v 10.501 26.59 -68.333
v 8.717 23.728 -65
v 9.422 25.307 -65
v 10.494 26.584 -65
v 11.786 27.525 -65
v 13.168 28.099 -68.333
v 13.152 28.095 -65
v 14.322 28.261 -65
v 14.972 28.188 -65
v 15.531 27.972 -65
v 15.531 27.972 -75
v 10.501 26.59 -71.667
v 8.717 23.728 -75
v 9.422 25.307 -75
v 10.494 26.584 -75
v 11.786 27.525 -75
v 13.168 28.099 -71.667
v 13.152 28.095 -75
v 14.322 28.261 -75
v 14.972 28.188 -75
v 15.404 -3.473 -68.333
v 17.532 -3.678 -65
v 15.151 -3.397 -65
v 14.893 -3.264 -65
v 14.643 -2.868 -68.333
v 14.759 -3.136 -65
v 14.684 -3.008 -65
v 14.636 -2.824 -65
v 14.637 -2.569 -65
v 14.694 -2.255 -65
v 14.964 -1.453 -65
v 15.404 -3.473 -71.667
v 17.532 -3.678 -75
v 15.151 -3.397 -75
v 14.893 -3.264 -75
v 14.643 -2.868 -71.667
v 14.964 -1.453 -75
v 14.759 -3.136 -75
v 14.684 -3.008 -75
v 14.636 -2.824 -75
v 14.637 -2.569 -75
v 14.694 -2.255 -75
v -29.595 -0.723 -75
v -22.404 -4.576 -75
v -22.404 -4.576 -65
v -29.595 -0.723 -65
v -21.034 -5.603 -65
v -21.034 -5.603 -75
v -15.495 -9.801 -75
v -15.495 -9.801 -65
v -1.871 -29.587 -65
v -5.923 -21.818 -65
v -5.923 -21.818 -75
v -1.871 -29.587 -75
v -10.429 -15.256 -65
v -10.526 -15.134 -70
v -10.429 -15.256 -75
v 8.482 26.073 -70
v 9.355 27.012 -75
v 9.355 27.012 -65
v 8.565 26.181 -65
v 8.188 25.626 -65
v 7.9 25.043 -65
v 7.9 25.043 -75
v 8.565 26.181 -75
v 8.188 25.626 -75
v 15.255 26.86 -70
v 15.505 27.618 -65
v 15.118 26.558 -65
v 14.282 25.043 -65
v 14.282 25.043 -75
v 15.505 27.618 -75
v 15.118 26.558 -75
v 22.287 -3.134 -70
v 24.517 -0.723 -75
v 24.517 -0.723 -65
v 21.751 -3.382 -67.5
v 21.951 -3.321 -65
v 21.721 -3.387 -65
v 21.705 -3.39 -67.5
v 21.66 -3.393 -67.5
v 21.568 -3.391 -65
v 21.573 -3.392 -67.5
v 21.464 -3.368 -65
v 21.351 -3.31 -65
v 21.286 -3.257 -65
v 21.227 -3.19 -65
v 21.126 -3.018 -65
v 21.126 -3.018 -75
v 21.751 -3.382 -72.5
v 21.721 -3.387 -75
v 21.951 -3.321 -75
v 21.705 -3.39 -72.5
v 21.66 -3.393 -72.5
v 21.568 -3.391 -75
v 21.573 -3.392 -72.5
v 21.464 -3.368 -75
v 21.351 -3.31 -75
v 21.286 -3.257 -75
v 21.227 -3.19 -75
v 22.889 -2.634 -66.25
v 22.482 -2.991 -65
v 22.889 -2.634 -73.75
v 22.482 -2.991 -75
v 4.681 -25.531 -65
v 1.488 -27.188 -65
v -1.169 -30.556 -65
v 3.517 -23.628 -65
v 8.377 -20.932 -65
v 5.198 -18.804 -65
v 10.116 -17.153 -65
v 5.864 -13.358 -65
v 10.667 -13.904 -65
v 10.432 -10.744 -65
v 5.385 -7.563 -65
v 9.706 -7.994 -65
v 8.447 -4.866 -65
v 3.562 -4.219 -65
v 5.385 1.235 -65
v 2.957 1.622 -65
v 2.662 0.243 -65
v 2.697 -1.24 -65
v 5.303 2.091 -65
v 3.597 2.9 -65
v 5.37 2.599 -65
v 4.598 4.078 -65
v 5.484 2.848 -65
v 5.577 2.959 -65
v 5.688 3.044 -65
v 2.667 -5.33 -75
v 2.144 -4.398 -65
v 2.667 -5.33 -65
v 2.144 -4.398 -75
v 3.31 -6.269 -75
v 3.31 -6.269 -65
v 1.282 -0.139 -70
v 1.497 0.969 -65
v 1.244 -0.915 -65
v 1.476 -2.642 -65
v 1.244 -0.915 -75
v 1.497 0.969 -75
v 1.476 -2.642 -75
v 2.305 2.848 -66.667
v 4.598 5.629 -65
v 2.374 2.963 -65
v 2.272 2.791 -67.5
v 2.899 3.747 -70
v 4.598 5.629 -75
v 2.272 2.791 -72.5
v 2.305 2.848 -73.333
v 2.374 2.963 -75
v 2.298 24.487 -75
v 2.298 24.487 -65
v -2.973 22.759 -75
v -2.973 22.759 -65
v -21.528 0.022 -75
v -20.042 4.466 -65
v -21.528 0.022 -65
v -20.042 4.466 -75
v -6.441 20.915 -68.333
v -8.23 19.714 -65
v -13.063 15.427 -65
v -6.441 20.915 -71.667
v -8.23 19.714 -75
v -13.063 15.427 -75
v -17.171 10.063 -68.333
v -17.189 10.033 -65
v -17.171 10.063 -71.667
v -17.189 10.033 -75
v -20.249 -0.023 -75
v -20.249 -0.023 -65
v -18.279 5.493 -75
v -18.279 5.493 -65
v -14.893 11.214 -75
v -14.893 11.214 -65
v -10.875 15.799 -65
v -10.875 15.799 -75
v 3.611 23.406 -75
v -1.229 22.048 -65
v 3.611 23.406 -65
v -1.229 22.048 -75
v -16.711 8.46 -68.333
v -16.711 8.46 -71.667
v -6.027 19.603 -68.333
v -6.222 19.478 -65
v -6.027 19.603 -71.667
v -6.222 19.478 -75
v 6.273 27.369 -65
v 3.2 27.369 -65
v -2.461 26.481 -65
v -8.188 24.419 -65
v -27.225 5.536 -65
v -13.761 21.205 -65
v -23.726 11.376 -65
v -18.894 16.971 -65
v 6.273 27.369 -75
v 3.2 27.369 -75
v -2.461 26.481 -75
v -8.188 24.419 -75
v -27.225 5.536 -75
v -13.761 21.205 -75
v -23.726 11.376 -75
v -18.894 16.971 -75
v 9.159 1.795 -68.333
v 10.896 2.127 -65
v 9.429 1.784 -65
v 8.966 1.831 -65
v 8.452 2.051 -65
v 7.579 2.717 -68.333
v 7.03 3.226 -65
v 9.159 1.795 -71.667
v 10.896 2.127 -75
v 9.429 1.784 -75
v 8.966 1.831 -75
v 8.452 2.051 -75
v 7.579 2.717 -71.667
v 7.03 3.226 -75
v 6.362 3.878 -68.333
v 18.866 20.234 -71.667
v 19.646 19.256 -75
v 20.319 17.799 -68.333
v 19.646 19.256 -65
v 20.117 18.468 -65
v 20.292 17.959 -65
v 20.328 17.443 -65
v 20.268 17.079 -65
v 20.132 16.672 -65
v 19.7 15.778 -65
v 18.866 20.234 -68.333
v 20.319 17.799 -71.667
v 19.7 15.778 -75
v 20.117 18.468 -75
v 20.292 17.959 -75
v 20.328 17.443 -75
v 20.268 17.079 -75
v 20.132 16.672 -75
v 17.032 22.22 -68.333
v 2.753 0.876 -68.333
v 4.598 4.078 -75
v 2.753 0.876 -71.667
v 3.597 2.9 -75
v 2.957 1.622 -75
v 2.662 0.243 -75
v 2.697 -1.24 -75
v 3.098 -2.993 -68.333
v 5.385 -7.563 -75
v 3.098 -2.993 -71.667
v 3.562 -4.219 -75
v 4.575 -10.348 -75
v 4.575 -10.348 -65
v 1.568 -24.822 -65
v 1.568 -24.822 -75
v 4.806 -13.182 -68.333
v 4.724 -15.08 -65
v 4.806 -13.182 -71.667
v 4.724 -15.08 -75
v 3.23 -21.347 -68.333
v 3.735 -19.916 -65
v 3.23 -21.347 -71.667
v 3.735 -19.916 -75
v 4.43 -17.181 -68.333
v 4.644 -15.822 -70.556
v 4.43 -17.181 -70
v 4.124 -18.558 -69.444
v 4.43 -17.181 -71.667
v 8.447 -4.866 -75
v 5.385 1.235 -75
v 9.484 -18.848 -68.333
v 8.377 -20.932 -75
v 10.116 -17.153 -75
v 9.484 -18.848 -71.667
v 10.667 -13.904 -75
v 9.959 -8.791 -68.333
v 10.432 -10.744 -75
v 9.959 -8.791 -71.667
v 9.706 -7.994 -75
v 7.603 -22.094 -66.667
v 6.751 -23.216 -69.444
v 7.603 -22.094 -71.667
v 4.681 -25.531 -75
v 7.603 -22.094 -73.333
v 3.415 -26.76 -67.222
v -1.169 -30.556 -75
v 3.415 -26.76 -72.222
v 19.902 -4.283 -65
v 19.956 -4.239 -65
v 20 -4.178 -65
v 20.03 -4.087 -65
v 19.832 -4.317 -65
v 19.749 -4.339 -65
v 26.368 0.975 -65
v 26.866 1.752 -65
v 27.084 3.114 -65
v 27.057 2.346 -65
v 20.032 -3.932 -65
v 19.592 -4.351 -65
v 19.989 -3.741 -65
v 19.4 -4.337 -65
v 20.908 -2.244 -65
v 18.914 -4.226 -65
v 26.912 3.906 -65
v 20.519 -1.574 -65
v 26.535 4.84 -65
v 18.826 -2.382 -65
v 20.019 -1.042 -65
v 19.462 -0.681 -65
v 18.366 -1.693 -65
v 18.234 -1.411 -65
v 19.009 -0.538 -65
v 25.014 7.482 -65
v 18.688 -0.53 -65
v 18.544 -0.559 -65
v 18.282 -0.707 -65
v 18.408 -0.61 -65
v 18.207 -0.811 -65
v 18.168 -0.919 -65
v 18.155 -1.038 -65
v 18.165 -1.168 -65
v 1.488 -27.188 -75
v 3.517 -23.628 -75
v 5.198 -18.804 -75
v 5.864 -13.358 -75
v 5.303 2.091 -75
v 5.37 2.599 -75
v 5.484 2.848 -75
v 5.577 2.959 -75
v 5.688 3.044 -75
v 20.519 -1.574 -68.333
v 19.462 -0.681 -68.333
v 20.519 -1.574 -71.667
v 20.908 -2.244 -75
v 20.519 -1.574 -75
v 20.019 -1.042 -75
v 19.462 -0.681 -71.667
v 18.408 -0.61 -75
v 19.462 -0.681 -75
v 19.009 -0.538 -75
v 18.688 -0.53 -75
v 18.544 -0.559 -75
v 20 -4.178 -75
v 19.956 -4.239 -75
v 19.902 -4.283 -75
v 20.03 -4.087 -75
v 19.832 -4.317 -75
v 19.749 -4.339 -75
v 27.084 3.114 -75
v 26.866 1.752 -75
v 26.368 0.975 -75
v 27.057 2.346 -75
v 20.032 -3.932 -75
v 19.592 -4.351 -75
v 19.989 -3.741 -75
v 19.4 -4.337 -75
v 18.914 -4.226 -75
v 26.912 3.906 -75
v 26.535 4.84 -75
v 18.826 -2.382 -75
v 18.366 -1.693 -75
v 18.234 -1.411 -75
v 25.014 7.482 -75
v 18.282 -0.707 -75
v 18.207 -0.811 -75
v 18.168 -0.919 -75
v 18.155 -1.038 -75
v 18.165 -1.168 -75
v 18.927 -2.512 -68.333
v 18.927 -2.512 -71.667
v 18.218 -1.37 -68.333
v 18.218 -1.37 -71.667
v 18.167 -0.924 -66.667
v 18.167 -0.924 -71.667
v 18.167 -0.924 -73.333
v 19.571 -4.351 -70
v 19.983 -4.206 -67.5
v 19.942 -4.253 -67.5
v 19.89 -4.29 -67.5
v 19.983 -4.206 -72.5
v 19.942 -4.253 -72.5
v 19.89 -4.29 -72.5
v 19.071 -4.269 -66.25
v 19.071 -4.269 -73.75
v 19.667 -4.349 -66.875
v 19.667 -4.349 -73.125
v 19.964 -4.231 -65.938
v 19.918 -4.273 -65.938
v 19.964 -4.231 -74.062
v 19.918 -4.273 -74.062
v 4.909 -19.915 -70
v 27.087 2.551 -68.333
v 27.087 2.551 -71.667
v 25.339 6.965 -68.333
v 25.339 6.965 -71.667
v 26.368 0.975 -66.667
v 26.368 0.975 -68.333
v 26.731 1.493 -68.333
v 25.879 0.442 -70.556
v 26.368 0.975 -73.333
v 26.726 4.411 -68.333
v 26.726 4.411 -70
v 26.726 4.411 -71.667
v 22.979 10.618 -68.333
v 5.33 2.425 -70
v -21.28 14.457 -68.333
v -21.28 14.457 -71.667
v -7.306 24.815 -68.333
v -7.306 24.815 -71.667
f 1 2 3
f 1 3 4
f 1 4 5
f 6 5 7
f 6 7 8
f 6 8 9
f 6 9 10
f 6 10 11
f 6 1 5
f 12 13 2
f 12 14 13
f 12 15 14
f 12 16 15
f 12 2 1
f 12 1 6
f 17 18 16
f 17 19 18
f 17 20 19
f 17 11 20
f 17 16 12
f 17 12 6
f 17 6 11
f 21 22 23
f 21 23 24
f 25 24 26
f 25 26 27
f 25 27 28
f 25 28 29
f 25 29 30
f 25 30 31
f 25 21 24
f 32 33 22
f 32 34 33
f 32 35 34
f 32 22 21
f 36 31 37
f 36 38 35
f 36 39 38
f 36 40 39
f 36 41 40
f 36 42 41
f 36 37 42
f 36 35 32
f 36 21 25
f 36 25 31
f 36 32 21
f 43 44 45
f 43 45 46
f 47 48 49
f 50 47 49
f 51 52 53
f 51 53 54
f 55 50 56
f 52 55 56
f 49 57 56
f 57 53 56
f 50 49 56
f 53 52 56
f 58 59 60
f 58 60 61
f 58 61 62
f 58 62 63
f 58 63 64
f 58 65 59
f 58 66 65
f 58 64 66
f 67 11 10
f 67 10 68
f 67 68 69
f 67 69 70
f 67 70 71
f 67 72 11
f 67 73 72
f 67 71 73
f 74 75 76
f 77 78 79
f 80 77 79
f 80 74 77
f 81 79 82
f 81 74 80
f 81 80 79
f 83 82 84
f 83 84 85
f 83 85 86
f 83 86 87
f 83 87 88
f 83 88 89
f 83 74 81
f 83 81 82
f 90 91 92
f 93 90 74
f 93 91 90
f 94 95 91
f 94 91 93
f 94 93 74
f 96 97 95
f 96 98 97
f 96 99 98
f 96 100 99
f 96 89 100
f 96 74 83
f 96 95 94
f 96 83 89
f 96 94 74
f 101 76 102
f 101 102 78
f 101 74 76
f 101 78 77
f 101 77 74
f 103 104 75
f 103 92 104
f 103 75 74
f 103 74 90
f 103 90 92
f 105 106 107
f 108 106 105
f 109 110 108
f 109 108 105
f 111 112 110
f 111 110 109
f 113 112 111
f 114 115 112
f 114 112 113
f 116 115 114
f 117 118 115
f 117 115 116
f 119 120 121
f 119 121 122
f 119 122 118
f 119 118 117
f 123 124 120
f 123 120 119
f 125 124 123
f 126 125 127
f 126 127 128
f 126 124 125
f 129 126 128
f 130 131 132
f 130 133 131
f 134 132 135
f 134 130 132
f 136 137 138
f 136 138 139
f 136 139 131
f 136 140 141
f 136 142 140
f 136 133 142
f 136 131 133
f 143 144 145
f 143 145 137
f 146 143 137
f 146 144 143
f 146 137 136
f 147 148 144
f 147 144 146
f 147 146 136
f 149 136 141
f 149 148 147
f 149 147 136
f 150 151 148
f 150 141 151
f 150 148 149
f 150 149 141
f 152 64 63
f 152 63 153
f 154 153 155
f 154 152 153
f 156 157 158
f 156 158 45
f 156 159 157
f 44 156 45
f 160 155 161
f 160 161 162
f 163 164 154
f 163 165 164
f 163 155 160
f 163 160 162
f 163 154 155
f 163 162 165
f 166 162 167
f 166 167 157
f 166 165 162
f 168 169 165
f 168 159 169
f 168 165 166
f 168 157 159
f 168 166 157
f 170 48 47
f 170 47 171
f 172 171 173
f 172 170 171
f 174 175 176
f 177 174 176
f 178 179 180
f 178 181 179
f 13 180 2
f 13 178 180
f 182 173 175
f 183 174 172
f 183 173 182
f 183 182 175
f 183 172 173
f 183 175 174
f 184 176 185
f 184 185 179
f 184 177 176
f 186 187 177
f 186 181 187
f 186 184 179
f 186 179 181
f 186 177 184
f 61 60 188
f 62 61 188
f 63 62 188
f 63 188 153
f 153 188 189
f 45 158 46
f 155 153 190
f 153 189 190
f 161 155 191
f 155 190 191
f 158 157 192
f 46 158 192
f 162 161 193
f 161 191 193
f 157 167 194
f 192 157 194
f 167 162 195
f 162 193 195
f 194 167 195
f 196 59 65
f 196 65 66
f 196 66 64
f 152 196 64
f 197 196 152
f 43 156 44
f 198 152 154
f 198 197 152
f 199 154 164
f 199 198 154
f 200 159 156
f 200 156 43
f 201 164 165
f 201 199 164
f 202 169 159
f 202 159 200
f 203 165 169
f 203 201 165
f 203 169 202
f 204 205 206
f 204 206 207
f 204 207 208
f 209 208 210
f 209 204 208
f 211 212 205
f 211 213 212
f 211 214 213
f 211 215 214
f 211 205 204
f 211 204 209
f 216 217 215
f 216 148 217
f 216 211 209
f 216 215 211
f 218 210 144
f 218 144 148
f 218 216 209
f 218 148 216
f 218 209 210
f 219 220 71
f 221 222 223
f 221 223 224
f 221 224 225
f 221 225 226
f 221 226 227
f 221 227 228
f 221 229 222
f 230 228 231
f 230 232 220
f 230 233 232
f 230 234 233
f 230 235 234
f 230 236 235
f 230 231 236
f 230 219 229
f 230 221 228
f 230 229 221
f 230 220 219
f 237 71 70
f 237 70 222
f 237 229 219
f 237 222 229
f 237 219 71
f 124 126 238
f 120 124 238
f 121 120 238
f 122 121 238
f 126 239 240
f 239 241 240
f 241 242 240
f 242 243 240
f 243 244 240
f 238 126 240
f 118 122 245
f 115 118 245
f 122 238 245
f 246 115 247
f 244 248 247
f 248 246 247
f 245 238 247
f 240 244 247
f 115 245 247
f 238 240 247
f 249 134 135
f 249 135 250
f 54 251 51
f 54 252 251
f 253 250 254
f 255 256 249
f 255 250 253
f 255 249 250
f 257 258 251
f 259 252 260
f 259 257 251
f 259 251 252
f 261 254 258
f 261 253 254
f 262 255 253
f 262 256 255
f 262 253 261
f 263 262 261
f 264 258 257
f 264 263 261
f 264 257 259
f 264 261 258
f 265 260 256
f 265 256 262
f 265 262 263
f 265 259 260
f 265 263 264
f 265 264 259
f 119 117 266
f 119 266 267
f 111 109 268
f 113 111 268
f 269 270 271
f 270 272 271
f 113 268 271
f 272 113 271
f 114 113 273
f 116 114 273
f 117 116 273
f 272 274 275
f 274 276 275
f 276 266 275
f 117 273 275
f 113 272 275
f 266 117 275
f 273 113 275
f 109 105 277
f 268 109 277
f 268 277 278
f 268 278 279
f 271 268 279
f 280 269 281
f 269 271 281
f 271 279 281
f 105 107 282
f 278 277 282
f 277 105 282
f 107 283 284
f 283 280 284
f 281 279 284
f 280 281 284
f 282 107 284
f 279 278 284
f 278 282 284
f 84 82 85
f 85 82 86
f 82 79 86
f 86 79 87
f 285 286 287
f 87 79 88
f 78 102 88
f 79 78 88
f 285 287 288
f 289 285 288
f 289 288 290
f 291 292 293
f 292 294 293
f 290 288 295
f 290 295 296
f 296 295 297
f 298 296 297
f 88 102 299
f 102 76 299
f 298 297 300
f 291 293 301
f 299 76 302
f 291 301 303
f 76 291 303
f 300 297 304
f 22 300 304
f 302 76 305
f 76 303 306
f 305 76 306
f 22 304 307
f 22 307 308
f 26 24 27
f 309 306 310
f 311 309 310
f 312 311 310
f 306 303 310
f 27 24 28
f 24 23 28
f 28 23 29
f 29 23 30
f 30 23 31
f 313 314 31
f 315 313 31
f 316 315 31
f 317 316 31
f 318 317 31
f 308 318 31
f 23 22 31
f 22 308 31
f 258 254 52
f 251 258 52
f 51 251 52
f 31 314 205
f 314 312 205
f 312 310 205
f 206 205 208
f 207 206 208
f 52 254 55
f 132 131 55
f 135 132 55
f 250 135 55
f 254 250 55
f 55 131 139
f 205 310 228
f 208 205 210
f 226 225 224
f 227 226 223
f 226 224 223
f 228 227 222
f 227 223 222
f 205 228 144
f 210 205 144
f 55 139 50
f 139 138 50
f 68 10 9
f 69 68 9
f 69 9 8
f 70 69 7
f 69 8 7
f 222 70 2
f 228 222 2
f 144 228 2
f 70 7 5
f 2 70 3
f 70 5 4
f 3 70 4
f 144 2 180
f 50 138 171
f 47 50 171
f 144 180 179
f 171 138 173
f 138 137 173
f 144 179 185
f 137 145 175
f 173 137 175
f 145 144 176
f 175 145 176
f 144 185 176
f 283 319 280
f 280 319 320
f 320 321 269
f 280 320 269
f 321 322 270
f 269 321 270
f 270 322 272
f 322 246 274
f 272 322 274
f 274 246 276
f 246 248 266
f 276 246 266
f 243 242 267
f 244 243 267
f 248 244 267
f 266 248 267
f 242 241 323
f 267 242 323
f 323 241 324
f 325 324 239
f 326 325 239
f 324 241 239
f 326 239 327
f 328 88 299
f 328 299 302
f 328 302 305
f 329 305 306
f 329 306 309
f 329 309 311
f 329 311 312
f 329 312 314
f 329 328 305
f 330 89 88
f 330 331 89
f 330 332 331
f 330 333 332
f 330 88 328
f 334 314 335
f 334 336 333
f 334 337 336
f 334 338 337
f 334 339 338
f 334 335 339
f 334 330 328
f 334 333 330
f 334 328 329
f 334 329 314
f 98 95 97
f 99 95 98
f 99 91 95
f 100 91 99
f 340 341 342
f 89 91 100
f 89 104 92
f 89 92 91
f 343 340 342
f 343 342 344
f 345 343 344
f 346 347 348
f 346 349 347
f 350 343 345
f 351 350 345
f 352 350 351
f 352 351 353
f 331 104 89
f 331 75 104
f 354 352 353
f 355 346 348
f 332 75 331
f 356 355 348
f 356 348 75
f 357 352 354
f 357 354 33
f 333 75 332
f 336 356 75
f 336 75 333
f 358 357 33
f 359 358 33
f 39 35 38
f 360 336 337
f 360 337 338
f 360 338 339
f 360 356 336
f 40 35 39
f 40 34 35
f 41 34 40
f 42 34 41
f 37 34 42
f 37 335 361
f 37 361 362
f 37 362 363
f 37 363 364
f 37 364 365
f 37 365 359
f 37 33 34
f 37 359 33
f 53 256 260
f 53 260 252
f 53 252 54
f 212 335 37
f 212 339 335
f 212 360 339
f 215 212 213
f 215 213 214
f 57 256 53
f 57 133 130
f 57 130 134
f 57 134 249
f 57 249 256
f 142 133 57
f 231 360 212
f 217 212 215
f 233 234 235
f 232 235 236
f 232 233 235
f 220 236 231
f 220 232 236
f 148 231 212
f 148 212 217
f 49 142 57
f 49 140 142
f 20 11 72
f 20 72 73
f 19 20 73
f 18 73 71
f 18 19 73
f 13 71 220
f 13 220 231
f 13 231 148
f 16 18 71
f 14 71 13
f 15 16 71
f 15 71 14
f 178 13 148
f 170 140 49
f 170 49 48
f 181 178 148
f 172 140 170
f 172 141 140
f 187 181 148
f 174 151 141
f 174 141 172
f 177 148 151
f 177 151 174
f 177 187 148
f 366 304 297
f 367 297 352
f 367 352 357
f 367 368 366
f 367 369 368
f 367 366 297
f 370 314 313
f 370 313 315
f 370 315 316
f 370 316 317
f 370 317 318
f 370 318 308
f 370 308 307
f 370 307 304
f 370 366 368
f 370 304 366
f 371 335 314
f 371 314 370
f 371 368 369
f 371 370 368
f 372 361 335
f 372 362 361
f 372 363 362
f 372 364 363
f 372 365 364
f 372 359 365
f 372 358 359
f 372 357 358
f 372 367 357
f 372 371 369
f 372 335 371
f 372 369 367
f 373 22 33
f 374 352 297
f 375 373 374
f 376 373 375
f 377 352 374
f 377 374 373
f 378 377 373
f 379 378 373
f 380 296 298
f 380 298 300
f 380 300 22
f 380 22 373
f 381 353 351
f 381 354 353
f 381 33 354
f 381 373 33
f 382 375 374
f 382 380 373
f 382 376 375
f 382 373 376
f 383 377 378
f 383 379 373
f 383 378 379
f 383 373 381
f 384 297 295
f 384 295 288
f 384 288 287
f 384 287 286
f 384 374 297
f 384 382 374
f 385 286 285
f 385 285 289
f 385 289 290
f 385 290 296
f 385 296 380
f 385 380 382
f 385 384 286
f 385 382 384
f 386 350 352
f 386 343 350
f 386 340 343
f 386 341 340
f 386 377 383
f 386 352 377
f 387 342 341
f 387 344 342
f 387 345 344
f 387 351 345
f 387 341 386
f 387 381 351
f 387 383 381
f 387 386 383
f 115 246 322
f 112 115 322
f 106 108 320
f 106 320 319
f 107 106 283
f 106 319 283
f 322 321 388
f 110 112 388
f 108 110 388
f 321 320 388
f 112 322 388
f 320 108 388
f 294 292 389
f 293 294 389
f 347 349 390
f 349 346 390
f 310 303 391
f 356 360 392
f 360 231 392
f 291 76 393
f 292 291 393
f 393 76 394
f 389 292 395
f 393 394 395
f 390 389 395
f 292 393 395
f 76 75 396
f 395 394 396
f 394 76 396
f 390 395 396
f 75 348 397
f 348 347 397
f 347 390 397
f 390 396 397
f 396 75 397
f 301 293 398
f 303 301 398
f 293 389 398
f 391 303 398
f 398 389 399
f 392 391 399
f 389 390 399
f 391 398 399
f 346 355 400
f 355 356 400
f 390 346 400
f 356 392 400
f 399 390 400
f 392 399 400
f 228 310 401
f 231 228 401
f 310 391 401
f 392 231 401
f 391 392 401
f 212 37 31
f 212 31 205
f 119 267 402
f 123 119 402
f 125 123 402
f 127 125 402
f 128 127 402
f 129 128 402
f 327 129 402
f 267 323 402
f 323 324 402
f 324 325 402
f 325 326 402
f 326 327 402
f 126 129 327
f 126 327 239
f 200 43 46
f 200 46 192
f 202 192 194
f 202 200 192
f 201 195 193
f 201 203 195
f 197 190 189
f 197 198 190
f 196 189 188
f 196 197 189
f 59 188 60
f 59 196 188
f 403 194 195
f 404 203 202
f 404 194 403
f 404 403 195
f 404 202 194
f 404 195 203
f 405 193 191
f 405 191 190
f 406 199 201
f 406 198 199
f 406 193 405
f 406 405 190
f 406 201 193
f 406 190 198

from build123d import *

# Parameters (mm, degrees)
BOSS_EXTRUDE6_START   = -75
BOSS_EXTRUDE6_DEPTH   = 10
BOSS_EXTRUDE6_2_DEPTH = 10
BOSS_EXTRUDE6_3_DEPTH = 10


with BuildPart() as part:
    # Sketch60 → Boss-Extrude6 (new body)
    with BuildSketch(Plane.XY.offset(BOSS_EXTRUDE6_START)):
        with BuildLine():
            add(Edge.make_bspline(
                [(7.899510272, 25.043165506), (-7.616062527, 25.257173407), (-20.549288392, 10.975590449), (-22.404008997, -4.575528469)],
                knots=[0, 0, 0, 0, 1, 1, 1, 1], degree=3))
            Line((-22.404008997, -4.575528469), (-29.594674586, -0.723386189))
            add(Edge.make_bspline(
                [(-29.594674586, -0.723386189), (-25.100511328, 15.755212423), (-7.658548516, 30.008093265), (9.354764023, 27.012038227)],
                knots=[0, 0, 0, 0, 1, 1, 1, 1], degree=3))
            add(Edge.make_bspline(
                [(9.354764023, 27.012038227), (8.337507713, 26.11755026), (7.899510272, 25.043165506)],
                knots=[0, 0, 0, 1, 1, 1], degree=2))
        make_face()
    extrude(amount=BOSS_EXTRUDE6_DEPTH)


with BuildPart() as body_2:
    # Sketch60 → Boss-Extrude6 2 (new body)
    with BuildSketch(Plane.XY.offset(BOSS_EXTRUDE6_START)):
        with BuildLine():
            add(Edge.make_bspline(
                [(-21.034358408, -5.60276641), (-20.658581062, 8.553464489), (-7.290986028, 24.477751373), (8.717335457, 23.728095995)],
                knots=[0, 0, 0, 0, 1, 1, 1, 1], degree=3))
            add(Edge.make_bspline(
                [(8.717335457, 23.728095995), (9.66306194, 27.172801895), (13.715689902, 29.012097365), (15.531023575, 27.971601235)],
                knots=[0, 0, 0, 0, 1, 1, 1, 1], degree=3))
            add(Edge.make_bspline(
                [(15.531023575, 27.971601235), (15.602666955, 27.212057166), (14.28241125, 25.043165506)],
                knots=[0, 0, 0, 1, 1, 1], degree=2))
            add(Edge.make_bspline(
                [(14.28241125, 25.043165506), (20.78562941, 18.394903927), (21.000842635, 18.24447546), (19.700260455, 15.777854084)],
                knots=[0, 0, 0, 0, 1, 1, 1, 1], degree=3))
            add(Edge.make_bspline(
                [(24.516635928, -0.723386189), (29.387839262, 3.066606953), (27.141695792, 3.679164482), (19.700260455, 15.777854084)],
                knots=[0, 0, 0, 0, 1, 1, 1, 1], degree=3))
            add(Edge.make_bspline(
                [(24.516635928, -0.723386189), (21.753412083, -4.397354565), (21.126152372, -3.017689185)],
                knots=[0, 0, 0, 1, 1, 1], degree=2))
            add(Edge.make_bspline(
                [(21.126152372, -3.017689185), (20.896285535, -1.389746942), (19.308339169, -0.179826073), (18.408429615, -0.610217599)],
                knots=[0, 0, 0, 0, 1, 1, 1, 1], degree=3))
            add(Edge.make_bspline(
                [(18.408429615, -0.610217599), (17.58666802, -1.079795653), (18.932824528, -2.56687226), (19.989391926, -3.740836035)],
                knots=[0, 0, 0, 0, 1, 1, 1, 1], degree=3))
            add(Edge.make_bspline(
                [(19.989391926, -3.740836035), (20.380619428, -4.992764042), (17.531856453, -3.678223666)],
                knots=[0, 0, 0, 1, 1, 1], degree=2))
            add(Edge.make_bspline(
                [(17.531856453, -3.678223666), (14.625120982, -3.53733032), (14.197274829, -3.40914492), (14.96429178, -1.453251695)],
                knots=[0, 0, 0, 0, 1, 1, 1, 1], degree=3))
            Line((14.96429178, -1.453251695), (10.896085132, 2.126595741))
            add(Edge.make_bspline(
                [(10.896085132, 2.126595741), (8.558808499, 1.4131365), (8.801315716, 1.477401795), (4.597691617, 5.628806961)],
                knots=[0, 0, 0, 0, 1, 1, 1, 1], degree=3))
            add(Edge.make_bspline(
                [(4.597691617, 5.628806961), (-1.389579693, 0.043058797), (3.310273965, -6.269124127)],
                knots=[0, 0, 0, 1, 1, 1], degree=2))
            add(Edge.make_bspline(
                [(3.310273965, -6.269124127), (6.190591422, -12.162929046), (5.143003854, -21.701416453), (-1.871341739, -29.587144351)],
                knots=[0, 0, 0, 0, 1, 1, 1, 1], degree=3))
            add(Edge.make_bspline(
                [(-21.034358408, -5.60276641), (-9.598924902, -12.672183887), (-1.871341739, -29.587144351)],
                knots=[0, 0, 0, 1, 1, 1], degree=2))
        make_face()
    extrude(amount=BOSS_EXTRUDE6_2_DEPTH)


with BuildPart() as body_3:
    # Sketch60 → Boss-Extrude6 3 (new body)
    with BuildSketch(Plane.XY.offset(BOSS_EXTRUDE6_START)):
        with BuildLine():
            add(Edge.make_bspline(
                [(4.597691617, 4.077756229), (1.575363437, 1.19846077), (2.21095693, -2.630747809), (5.384533612, -7.562523507)],
                knots=[0, 0, 0, 0, 1, 1, 1, 1], degree=3))
            add(Edge.make_bspline(
                [(5.384533612, -7.562523507), (7.711001047, -20.771808771), (-1.168779613, -30.555851486)],
                knots=[0, 0, 0, 1, 1, 1], degree=2))
            add(Edge.make_bspline(
                [(-1.168779613, -30.555851486), (16.280884402, -17.481086084), (10.776039321, -9.316518746), (5.384533612, 1.234606835)],
                knots=[0, 0, 0, 0, 1, 1, 1, 1], degree=3))
            add(Edge.make_bspline(
                [(5.384533612, 1.234606835), (5.124429062, 2.709937223), (5.687861943, 3.043823375)],
                knots=[0, 0, 0, 1, 1, 1], degree=2))
            Line((5.687861943, 3.043823375), (4.597691617, 4.077756229))
        make_face()
    extrude(amount=BOSS_EXTRUDE6_3_DEPTH)


solid = Compound([part.part, body_2.part, body_3.part])
